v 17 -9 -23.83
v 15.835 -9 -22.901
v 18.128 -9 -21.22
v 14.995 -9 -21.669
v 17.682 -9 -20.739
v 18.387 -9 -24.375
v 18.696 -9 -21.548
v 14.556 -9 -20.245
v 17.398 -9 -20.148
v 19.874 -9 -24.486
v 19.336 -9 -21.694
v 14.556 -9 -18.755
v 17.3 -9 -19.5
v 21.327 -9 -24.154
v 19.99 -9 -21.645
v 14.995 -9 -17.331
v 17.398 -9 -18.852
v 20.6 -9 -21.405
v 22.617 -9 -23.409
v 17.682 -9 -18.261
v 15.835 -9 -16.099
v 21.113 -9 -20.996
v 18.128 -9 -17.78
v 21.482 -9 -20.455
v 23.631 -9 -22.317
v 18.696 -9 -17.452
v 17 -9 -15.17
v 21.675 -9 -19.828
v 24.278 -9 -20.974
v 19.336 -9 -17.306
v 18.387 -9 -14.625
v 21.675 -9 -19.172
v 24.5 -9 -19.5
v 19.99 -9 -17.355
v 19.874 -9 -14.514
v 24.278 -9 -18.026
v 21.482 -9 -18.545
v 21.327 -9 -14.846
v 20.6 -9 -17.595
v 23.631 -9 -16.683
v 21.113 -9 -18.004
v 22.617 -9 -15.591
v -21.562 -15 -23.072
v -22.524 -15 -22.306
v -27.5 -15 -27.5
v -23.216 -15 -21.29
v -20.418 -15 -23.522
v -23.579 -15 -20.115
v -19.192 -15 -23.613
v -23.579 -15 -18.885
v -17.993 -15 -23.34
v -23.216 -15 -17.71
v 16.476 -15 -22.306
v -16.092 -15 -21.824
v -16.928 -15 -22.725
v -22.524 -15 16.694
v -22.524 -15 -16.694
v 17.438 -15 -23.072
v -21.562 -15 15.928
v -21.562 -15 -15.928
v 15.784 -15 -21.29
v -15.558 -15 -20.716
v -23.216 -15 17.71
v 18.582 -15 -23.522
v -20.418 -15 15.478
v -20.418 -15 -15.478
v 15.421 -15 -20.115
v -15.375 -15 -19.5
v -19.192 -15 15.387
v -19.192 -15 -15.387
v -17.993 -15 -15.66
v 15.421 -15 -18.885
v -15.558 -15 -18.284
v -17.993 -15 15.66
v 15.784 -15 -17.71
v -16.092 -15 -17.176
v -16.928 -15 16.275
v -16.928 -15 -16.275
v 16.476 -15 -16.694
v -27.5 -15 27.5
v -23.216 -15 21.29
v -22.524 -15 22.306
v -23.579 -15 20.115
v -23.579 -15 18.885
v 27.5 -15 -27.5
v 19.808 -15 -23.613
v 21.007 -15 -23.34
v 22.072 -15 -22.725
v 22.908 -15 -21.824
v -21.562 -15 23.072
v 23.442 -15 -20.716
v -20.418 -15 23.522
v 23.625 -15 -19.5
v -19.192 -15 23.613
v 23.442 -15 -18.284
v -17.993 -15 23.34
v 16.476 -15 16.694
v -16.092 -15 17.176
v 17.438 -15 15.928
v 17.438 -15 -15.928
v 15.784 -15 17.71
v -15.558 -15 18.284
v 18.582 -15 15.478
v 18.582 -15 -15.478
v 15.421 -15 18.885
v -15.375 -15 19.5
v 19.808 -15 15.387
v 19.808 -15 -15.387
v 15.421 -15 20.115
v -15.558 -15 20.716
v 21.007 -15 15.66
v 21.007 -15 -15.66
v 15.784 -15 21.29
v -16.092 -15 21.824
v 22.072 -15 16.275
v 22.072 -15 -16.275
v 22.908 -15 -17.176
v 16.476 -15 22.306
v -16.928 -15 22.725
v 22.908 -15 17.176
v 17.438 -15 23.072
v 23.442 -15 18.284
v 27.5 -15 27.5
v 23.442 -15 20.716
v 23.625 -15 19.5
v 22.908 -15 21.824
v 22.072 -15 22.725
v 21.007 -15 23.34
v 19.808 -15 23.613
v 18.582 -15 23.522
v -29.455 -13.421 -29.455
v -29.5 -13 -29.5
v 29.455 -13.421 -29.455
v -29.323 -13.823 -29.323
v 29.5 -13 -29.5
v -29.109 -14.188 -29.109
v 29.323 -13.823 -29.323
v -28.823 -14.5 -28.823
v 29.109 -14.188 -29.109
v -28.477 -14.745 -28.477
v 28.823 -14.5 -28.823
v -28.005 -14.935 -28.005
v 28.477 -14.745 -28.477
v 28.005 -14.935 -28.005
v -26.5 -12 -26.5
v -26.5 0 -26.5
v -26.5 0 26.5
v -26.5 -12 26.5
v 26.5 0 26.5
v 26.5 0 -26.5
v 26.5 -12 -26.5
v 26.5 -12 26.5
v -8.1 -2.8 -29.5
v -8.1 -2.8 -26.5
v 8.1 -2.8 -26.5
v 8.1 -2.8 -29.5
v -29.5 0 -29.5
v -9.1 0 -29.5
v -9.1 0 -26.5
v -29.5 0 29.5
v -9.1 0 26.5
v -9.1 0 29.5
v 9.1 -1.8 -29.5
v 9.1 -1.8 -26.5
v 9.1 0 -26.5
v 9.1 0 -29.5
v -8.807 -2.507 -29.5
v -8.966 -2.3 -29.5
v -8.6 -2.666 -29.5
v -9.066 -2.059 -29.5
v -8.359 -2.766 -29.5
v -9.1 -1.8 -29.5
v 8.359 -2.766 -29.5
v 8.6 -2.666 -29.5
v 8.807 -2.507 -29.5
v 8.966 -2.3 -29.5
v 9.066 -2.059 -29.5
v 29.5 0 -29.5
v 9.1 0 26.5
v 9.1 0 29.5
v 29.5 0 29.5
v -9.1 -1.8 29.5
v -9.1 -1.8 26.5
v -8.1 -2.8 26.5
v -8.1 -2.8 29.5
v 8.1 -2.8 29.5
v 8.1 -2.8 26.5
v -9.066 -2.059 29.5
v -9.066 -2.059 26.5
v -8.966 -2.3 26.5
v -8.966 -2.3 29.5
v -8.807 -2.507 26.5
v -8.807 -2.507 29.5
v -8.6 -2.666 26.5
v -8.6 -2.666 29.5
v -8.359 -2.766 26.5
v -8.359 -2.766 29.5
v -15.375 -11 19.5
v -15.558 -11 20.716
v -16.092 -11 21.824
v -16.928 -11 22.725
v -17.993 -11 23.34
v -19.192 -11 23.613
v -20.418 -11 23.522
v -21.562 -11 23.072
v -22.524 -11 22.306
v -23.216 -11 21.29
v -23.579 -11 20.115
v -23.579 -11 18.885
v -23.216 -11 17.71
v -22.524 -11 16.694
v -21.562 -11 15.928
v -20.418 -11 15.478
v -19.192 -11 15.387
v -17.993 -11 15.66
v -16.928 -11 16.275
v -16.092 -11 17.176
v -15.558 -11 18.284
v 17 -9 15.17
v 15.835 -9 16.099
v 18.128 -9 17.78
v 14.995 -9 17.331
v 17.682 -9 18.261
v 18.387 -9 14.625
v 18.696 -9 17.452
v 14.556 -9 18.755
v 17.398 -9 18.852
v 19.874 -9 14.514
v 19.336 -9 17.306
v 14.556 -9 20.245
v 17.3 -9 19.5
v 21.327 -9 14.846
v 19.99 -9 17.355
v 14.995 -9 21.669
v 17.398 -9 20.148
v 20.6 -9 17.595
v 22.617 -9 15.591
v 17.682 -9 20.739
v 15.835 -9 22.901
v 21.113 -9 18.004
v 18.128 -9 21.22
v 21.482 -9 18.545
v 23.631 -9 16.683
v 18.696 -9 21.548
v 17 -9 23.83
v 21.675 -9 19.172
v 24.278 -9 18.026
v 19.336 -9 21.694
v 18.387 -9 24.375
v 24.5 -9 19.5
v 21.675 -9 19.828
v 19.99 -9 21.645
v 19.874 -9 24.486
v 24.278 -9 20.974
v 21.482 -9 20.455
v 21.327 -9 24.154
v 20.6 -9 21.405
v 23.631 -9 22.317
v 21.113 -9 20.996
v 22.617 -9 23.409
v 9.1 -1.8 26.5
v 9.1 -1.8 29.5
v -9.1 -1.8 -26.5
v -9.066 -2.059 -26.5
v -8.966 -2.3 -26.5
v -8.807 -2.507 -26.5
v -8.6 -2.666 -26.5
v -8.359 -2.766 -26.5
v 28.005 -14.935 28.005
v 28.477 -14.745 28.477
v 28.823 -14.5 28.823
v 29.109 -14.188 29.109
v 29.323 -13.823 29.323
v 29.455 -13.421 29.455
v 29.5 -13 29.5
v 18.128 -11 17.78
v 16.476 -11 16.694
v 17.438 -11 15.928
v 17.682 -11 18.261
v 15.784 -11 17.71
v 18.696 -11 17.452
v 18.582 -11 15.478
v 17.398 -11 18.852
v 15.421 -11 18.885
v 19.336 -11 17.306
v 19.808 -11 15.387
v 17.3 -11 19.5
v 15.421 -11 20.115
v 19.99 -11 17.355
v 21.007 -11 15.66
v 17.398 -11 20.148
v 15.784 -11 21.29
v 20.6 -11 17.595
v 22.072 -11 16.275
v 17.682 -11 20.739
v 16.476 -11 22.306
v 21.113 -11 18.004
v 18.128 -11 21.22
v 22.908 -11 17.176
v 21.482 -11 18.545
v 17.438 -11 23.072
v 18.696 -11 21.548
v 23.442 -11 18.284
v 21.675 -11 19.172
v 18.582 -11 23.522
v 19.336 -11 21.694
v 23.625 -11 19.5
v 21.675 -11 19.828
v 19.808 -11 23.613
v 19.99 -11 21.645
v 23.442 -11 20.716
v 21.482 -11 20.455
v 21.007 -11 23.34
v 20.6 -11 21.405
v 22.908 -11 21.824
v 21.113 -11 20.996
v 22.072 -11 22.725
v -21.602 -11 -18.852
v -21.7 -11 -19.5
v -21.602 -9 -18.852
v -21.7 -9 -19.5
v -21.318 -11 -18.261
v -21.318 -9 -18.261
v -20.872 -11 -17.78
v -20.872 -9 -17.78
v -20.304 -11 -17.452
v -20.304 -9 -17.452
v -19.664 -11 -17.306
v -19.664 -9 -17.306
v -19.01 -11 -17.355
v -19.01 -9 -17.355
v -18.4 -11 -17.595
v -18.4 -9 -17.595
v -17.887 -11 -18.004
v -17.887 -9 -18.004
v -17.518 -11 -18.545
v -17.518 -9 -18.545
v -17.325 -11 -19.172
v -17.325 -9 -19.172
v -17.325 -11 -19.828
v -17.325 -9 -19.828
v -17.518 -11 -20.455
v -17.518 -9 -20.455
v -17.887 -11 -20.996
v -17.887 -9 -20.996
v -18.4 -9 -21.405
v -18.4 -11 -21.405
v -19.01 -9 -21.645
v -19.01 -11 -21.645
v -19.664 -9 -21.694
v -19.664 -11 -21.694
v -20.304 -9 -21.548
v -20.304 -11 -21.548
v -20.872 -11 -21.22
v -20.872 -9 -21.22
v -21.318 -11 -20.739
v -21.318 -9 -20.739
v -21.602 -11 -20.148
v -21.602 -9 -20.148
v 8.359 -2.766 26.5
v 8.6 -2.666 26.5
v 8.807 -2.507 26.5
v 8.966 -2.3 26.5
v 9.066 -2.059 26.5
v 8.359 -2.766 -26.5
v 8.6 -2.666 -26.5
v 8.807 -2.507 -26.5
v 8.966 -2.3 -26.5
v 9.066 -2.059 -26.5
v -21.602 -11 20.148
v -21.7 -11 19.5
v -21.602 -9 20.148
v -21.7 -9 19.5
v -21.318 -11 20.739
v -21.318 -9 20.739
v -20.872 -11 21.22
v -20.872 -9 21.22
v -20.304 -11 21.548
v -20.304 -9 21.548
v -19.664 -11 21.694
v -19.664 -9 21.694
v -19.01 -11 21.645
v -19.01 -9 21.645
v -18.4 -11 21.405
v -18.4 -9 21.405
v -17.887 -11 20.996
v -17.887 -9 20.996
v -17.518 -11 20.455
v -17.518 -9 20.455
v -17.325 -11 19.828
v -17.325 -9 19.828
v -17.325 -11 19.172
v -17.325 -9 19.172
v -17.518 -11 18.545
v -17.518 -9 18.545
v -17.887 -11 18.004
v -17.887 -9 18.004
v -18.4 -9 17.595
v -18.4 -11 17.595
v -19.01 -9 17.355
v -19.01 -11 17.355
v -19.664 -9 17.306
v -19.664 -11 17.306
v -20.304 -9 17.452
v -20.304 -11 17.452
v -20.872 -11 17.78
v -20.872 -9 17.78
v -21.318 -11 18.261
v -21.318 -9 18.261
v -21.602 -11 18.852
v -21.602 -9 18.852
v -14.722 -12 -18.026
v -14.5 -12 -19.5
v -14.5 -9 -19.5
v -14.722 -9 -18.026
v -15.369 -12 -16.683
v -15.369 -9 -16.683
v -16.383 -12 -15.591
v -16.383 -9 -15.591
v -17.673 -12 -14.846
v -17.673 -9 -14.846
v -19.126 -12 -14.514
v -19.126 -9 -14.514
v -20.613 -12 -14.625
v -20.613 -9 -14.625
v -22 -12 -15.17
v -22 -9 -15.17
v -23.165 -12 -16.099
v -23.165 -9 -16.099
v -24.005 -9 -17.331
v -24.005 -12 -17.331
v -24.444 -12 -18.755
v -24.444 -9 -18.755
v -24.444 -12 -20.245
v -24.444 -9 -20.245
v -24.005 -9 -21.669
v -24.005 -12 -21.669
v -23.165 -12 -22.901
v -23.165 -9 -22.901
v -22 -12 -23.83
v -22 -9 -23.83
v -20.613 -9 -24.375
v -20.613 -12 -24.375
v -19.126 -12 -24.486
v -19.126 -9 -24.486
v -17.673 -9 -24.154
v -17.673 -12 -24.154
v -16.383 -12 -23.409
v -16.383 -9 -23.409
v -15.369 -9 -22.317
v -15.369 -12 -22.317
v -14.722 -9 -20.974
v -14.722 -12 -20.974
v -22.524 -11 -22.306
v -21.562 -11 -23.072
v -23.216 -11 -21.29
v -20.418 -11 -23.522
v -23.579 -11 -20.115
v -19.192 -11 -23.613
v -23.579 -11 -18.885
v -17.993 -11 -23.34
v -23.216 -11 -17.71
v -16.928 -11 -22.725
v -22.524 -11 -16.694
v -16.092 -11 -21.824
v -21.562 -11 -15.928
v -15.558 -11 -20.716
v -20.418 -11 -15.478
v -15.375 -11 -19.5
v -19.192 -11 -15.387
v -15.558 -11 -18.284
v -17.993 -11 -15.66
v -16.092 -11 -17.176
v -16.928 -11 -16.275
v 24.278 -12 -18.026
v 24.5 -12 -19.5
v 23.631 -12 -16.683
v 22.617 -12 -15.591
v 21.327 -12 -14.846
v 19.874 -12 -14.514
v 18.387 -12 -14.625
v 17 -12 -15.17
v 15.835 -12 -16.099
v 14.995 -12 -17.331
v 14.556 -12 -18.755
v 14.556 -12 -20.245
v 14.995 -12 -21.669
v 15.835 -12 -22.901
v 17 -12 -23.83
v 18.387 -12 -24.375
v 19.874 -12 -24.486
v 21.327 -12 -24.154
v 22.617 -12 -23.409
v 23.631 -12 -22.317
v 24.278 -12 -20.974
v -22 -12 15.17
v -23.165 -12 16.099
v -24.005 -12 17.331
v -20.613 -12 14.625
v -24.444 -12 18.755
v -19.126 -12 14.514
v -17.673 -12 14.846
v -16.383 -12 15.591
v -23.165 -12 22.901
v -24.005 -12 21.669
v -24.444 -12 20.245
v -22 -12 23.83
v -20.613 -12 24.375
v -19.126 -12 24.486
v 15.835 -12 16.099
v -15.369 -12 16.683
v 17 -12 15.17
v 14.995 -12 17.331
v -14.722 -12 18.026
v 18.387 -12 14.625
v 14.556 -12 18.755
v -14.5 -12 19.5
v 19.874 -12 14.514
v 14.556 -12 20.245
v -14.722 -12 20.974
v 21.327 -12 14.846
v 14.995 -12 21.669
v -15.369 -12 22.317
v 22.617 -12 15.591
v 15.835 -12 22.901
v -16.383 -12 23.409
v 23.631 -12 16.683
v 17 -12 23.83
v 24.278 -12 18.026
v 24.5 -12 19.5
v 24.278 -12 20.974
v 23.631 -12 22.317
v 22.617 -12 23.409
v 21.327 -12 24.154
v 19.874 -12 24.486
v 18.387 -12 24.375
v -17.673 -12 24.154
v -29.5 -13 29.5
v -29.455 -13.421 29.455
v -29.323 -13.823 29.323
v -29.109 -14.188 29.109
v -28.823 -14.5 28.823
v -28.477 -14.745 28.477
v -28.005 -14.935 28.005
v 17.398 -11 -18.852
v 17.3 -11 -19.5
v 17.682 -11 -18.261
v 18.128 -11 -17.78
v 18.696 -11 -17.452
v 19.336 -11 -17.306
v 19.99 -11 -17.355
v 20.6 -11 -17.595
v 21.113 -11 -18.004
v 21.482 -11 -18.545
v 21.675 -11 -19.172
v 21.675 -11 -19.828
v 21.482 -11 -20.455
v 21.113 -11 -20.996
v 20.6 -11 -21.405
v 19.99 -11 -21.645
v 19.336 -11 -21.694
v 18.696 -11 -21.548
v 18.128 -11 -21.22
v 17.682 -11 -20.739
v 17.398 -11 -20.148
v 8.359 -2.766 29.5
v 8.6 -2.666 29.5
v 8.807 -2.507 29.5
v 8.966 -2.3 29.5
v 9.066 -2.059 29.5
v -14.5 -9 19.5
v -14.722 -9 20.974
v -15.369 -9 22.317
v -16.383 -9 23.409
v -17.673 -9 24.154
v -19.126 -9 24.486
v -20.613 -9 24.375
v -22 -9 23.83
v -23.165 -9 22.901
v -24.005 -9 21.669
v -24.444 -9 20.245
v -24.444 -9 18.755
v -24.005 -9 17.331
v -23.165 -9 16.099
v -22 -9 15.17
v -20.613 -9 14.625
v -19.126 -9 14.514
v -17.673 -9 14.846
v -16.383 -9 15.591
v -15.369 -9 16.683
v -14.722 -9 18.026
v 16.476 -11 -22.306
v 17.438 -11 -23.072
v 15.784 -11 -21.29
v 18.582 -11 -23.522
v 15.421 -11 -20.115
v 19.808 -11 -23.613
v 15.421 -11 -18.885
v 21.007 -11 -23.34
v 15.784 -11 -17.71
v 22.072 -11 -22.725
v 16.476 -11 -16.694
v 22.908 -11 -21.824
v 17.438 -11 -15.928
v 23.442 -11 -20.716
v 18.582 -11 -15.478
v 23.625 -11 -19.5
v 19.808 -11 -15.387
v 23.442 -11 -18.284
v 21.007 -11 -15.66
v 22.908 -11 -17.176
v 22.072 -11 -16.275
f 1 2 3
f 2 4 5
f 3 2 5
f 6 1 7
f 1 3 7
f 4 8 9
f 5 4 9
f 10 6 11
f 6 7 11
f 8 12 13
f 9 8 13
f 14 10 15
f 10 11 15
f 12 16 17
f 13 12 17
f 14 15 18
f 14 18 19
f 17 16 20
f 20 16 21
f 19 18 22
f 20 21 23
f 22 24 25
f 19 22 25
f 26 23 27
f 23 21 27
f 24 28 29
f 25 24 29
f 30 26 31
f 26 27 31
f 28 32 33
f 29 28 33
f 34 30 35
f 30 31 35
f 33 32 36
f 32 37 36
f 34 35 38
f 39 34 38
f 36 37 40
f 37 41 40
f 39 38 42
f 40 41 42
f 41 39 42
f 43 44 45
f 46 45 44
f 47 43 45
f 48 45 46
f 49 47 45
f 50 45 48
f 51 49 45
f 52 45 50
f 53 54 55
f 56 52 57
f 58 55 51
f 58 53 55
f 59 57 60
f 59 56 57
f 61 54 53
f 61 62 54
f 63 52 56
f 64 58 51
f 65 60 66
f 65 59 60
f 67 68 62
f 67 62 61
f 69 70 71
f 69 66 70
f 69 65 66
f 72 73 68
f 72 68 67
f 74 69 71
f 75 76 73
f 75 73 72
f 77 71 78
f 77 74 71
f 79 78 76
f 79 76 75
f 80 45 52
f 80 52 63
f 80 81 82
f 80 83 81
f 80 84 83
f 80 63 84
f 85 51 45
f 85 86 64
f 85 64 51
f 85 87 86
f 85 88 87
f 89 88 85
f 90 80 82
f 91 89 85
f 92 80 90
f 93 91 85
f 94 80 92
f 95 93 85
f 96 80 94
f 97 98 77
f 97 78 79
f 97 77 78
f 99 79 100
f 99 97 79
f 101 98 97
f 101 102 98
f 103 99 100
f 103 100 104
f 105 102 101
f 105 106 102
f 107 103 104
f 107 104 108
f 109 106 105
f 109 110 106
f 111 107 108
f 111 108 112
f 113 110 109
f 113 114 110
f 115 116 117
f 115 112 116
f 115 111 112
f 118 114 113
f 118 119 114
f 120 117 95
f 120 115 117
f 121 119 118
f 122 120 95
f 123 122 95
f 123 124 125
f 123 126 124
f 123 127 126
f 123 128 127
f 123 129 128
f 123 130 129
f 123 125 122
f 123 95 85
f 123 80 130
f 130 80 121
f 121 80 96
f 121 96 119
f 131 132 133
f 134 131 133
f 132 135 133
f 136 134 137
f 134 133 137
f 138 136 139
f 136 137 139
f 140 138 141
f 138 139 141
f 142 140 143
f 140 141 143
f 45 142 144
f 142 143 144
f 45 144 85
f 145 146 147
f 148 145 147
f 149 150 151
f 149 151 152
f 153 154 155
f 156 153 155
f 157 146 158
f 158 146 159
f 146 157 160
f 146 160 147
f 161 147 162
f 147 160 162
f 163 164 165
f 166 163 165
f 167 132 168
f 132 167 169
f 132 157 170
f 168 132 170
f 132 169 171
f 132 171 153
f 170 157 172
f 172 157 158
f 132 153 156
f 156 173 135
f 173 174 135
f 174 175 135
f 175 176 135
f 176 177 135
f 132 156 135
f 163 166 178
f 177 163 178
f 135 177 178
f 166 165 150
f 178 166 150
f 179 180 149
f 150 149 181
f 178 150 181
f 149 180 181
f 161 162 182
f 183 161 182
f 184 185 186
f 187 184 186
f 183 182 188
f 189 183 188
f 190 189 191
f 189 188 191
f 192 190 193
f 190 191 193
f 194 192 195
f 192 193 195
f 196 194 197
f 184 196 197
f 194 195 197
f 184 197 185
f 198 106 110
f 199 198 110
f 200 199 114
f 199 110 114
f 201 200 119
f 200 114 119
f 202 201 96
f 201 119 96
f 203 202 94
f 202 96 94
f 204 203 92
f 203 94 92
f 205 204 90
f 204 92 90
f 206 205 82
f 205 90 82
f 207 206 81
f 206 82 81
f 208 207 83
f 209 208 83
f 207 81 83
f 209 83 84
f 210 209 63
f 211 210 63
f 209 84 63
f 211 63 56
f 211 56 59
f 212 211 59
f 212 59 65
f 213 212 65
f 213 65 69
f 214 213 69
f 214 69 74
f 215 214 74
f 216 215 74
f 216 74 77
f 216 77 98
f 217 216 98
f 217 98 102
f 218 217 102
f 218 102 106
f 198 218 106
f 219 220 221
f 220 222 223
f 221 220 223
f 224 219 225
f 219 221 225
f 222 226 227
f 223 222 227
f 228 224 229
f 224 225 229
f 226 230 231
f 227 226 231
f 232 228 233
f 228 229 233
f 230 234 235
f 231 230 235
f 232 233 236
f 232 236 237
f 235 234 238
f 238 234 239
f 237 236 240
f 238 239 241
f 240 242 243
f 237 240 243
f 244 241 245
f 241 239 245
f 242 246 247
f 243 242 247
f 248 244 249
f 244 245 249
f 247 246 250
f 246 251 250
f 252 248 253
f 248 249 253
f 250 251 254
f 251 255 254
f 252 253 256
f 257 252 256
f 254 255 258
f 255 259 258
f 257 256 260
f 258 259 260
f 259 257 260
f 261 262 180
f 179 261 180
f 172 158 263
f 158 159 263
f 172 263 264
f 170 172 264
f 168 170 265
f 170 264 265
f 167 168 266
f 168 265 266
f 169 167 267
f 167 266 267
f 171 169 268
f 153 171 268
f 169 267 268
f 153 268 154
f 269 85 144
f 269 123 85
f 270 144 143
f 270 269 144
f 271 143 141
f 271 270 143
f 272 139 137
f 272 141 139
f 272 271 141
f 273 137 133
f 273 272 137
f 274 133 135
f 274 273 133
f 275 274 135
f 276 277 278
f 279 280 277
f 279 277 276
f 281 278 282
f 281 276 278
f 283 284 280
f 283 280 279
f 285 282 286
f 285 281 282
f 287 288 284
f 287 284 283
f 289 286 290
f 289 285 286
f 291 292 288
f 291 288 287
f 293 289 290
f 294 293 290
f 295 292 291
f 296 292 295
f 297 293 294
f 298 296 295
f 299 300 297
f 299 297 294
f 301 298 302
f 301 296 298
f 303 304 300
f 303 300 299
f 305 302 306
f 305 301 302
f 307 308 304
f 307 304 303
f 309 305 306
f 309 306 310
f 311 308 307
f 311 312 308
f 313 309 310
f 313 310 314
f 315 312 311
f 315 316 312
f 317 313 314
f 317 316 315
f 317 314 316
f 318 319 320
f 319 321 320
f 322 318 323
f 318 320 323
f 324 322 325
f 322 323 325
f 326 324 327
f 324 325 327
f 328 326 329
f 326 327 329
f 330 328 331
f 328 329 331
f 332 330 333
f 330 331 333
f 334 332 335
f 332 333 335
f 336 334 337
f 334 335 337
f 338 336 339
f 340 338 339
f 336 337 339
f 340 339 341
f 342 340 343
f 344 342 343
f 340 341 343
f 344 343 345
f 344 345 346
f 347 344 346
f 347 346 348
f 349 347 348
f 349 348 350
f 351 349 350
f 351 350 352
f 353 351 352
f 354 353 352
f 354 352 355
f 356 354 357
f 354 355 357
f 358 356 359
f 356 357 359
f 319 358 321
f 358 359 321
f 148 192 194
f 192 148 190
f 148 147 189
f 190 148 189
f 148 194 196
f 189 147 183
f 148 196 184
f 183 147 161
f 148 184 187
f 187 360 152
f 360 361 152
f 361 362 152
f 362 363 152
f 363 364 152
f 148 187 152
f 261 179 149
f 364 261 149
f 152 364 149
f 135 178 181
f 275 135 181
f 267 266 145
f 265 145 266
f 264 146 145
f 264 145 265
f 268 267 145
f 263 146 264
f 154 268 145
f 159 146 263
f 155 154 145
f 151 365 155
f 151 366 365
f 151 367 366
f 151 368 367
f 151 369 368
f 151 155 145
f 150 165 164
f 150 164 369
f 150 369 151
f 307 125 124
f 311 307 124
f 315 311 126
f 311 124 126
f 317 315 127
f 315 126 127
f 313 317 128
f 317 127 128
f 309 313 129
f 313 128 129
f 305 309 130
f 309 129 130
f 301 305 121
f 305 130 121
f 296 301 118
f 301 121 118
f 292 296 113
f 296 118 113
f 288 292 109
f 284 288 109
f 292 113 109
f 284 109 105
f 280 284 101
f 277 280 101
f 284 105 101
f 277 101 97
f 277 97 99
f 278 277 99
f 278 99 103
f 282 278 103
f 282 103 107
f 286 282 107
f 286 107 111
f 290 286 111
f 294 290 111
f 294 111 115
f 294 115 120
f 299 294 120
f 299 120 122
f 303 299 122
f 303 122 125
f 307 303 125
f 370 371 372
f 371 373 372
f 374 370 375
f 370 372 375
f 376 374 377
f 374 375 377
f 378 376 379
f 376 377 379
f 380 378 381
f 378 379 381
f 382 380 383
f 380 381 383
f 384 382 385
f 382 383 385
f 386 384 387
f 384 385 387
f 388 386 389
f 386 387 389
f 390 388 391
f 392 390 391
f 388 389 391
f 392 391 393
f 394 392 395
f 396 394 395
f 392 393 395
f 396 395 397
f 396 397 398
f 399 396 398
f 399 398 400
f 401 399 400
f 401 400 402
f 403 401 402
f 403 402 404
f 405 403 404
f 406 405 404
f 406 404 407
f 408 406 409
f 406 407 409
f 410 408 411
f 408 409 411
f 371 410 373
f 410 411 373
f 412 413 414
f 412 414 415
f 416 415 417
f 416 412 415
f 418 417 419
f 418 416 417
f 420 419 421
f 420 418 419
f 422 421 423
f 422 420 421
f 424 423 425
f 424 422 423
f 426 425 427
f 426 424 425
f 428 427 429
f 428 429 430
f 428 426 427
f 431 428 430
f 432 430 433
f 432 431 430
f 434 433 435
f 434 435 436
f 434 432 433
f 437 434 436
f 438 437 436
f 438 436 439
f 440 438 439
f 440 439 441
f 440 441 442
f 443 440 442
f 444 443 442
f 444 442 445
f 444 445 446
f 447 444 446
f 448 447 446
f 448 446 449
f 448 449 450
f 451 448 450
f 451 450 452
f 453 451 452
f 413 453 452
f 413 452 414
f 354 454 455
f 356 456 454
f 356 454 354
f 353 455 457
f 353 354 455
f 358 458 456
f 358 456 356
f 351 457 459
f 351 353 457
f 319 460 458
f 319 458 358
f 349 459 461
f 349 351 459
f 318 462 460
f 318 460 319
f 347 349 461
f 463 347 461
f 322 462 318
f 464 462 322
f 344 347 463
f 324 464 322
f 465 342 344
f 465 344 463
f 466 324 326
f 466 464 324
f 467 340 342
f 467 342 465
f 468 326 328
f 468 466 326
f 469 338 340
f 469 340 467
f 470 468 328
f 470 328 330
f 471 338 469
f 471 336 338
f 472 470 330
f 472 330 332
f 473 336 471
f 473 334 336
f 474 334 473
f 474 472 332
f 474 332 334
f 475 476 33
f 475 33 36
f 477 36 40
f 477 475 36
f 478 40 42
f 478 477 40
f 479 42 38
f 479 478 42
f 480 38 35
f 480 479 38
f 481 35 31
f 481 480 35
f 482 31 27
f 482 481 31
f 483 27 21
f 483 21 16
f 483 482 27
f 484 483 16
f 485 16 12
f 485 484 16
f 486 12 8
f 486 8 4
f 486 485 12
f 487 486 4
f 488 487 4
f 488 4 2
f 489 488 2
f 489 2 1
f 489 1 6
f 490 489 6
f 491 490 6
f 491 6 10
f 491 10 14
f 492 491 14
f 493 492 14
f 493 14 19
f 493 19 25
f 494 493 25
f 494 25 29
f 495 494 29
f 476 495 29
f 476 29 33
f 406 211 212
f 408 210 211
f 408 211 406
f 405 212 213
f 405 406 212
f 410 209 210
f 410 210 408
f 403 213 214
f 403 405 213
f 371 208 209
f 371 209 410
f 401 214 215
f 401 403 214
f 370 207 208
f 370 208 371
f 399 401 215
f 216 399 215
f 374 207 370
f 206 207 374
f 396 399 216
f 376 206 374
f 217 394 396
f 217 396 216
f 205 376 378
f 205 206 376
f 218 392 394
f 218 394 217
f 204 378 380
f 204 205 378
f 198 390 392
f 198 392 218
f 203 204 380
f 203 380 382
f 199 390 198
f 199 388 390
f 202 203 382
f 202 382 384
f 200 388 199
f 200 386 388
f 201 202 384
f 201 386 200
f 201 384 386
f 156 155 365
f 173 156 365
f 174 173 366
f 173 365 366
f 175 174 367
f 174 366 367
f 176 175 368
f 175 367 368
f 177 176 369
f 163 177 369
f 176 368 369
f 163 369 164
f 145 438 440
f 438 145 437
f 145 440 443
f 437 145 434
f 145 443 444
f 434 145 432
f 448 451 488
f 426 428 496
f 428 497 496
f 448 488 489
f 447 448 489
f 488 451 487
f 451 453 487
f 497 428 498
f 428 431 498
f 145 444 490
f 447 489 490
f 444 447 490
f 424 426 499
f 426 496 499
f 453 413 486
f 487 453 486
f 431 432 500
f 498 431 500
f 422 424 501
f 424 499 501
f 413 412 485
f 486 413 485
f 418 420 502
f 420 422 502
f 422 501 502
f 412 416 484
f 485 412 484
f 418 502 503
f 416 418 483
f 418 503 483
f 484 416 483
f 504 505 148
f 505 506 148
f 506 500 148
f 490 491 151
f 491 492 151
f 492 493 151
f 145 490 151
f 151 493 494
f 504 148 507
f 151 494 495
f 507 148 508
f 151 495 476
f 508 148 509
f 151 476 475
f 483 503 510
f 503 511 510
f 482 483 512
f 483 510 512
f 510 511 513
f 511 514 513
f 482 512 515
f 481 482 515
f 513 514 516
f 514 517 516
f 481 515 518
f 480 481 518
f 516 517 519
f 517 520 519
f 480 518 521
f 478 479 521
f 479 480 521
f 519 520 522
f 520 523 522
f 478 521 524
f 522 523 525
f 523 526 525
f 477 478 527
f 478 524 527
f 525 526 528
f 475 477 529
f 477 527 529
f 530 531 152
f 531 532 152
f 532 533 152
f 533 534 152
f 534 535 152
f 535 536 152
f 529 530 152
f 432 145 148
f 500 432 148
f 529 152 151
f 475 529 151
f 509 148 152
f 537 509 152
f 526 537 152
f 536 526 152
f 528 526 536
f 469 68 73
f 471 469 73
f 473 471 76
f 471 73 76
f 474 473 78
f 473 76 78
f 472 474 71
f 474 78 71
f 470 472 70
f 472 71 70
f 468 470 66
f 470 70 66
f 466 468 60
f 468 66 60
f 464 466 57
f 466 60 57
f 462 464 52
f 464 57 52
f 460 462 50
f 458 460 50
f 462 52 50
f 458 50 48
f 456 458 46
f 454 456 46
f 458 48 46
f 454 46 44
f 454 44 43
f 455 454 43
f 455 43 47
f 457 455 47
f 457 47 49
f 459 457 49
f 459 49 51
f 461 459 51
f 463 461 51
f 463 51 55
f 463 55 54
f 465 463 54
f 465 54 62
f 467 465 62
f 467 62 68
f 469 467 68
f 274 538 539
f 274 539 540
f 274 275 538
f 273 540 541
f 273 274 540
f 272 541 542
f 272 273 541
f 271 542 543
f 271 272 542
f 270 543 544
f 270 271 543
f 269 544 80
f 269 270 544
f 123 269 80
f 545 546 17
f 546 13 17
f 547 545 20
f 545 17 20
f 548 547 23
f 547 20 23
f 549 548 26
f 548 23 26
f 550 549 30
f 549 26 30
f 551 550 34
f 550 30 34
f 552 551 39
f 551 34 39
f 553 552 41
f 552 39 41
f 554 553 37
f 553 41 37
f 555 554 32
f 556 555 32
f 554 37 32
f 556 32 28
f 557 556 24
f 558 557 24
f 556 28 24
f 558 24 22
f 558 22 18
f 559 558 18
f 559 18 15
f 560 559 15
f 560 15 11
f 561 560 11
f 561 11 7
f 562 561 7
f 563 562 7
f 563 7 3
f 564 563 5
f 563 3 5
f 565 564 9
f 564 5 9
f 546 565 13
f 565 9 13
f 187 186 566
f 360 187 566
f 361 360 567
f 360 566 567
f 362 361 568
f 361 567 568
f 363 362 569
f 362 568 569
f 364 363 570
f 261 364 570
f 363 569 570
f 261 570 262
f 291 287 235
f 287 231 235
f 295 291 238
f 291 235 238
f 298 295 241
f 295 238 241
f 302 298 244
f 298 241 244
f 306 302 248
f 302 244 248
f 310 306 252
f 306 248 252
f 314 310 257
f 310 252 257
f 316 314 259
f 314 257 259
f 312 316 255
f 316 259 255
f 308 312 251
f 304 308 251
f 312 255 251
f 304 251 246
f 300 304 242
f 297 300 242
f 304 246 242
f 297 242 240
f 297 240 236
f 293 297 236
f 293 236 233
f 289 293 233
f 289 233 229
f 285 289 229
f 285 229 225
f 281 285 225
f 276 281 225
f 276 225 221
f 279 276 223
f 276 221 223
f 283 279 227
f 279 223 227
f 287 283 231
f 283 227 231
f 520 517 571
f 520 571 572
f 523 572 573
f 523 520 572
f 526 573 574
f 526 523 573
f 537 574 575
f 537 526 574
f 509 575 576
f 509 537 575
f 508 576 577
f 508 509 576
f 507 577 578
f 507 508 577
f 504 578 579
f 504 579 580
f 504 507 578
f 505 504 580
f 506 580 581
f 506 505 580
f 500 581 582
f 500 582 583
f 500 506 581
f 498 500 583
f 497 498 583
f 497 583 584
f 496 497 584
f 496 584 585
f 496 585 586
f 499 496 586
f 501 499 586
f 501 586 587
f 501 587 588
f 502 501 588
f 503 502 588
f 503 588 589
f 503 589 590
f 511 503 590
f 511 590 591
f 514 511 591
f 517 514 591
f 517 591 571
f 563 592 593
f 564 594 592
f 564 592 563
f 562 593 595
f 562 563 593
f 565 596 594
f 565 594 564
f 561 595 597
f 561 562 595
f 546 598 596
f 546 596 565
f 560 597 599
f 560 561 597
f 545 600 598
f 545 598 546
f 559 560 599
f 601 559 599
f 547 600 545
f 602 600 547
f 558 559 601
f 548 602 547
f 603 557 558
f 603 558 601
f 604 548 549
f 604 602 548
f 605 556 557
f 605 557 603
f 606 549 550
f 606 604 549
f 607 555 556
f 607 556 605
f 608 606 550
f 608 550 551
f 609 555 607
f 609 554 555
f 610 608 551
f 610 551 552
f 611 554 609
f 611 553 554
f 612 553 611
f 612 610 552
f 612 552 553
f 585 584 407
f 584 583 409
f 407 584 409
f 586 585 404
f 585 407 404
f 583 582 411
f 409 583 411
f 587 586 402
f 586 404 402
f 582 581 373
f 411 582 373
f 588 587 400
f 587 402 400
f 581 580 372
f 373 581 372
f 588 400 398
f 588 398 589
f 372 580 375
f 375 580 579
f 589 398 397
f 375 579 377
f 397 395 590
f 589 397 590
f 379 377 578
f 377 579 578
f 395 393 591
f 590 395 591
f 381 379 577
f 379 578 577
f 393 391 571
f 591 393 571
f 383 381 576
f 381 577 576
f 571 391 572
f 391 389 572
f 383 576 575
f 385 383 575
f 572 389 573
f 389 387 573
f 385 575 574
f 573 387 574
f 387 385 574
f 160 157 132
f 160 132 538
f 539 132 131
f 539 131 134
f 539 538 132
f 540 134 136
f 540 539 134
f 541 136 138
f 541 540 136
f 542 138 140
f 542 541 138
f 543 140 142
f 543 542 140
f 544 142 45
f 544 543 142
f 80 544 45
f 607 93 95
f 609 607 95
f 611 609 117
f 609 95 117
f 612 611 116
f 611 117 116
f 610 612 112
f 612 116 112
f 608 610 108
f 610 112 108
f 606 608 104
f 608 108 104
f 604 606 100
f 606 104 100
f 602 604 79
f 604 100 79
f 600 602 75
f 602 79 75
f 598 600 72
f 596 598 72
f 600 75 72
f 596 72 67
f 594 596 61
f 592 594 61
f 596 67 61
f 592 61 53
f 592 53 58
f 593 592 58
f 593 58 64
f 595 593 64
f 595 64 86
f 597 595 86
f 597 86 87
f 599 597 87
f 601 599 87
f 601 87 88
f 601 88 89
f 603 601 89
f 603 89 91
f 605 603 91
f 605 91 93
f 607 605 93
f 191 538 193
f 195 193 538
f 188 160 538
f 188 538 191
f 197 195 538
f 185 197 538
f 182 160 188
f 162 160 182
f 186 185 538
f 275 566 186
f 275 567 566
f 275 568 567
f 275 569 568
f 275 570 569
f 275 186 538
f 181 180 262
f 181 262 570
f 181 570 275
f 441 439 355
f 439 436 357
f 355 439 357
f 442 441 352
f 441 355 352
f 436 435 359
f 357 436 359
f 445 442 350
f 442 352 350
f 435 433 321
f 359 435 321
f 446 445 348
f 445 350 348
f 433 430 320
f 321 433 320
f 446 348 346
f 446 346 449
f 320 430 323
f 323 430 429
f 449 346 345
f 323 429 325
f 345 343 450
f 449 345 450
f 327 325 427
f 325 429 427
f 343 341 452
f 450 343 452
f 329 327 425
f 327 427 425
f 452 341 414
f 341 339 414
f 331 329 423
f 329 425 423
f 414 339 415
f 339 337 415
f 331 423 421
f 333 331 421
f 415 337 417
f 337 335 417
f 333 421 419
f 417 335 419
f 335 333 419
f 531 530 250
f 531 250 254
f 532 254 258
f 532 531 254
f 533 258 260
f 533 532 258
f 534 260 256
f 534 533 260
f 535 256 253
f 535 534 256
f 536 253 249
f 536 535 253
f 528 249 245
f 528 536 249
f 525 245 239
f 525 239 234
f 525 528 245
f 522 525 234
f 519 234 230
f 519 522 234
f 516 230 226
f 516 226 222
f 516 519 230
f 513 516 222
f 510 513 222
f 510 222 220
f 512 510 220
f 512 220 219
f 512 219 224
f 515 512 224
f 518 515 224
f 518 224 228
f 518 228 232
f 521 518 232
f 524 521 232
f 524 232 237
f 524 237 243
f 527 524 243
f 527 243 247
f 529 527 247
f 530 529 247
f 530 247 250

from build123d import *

# Parameters (mm, degrees)
F0_W            = 59
F0_H            = 59
F3_DEPTH        = 15
F1_W            = 53
F1_H            = 53
F4_DEPTH        = 12
F5_R            = 2
F7_R            = 5
F8_DEPTH        = 6
F10_D           = 4.4
F10_CBORE_D     = 8.25
F10_CBORE_DEPTH = 4
F11_D           = 4.4
F11_CBORE_D     = 8.25
F11_CBORE_DEPTH = 4
F12_D           = 4.4
F12_CBORE_D     = 8.25
F12_CBORE_DEPTH = 4
F13_D           = 4.4
F13_CBORE_D     = 8.25
F13_CBORE_DEPTH = 4
F14_DEPTH       = 30


with BuildPart() as f3:
    # F0 (on Front) → F3 (new body)
    with BuildSketch(Plane.XZ):
        Rectangle(F0_W, F0_H)
    extrude(amount=F3_DEPTH)

    # F1 (on Front) → F4 (cut)
    with BuildSketch(Plane.XZ):
        Rectangle(F1_W, F1_H)
    extrude(amount=F4_DEPTH, mode=Mode.SUBTRACT)

    # F5
    f5_edges = [f3.edges().sort_by_distance(p)[0] for p in [
        (0, -15, 29.5),
        (-29.5, -15, 0),
        (0, -15, -29.5),
        (29.5, -15, 0),
    ]]
    fillet(f5_edges, radius=F5_R)

    # F7 (on offset) → F8 (join)
    with BuildSketch(Plane.XZ.offset(15)):
        with Locations((19.5, 19.5)):
            Circle(F7_R)
        with Locations((-19.5, 19.5)):
            Circle(F7_R)
        with Locations((19.5, -19.5)):
            Circle(F7_R)
        with Locations((-19.5, -19.5)):
            Circle(F7_R)
    extrude(amount=-F8_DEPTH)

    # F10 (through all)
    with Locations(Plane.XZ.offset(15)):
        with Locations((-19.5, 19.5)):
            CounterBoreHole(F10_D / 2, F10_CBORE_D / 2, F10_CBORE_DEPTH)

    # F11 (through all)
    with Locations(Plane.XZ.offset(15)):
        with Locations((-19.5, -19.5)):
            CounterBoreHole(F11_D / 2, F11_CBORE_D / 2, F11_CBORE_DEPTH)

    # F12 (through all)
    with Locations(Plane.XZ.offset(15)):
        with Locations((19.5, -19.5)):
            CounterBoreHole(F12_D / 2, F12_CBORE_D / 2, F12_CBORE_DEPTH)

    # F13 (through all)
    with Locations(Plane.XZ.offset(15)):
        with Locations((19.5, 19.5)):
            CounterBoreHole(F13_D / 2, F13_CBORE_D / 2, F13_CBORE_DEPTH)

    # F2 (on Top) → F14 (cut, symmetric)
    with BuildSketch(Plane.XY):
        with BuildLine():
            Line((8.1, 2.8), (-8.1, 2.8))
            ThreePointArc((-8.1, 2.8), (-8.8071067812, 2.5071067812), (-9.1, 1.8))
            Line((-9.1, 1.8), (-9.1, -1.8))
            ThreePointArc((-9.1, -1.8), (-8.8071067812, -2.5071067812), (-8.1, -2.8))
            Line((-8.1, -2.8), (8.1, -2.8))
            ThreePointArc((8.1, -2.8), (8.8071067812, -2.5071067812), (9.1, -1.8))
            Line((9.1, -1.8), (9.1, 1.8))
            ThreePointArc((9.1, 1.8), (8.8071067812, 2.5071067812), (8.1, 2.8))
        make_face()
    extrude(amount=F14_DEPTH, both=True, mode=Mode.SUBTRACT)


solid = f3.part
